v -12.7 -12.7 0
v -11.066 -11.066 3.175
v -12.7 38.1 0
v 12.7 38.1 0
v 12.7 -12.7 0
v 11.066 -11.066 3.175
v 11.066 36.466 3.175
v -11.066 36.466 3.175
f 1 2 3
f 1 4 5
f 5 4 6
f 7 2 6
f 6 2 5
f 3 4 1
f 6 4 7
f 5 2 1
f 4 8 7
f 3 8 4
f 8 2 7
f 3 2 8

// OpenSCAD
//Base Generator for Miniature Wargamers

//Measurements in milimeters or inches?
units=1; // [0:millimeters, 1:inches]
//how wide in mm should the base be?
base_width = 1;
//how deep should the base be? must be equal to or greater than width
base_depth = 2;
//how tall should the base be?
base_height = .125;
//What angle should the sides be? 70 is a good value; use 90 for straight sides
angle= 70;
//what shape?
shape=4; // [4:rectangle, 6:octangle, 80:lozenge]
/* [Base Slot] */
//What kind of slot?
slot_type=0; // [0:none, 1:end to end, 2:corner to corner, 3:end-to-end double]
//How long is the slot?
slot_length = .5;
//How wide is the slot?
slot_width = .09;
//For offset slots, how deep is the offset? (required for double slots)
slot_offset = 0;
/* [Base Indent] */
//% to indent the top surface? (0 for no indent)
base_indent=0;
//% of top surface to indent?
base_indent_area=95;
/* [Central Hole] */
//what shape?
hole_shape=0; // [0:none, 4:diamond, 6:hexagon, 80:round]
//hole diameter?
hole_radius=.35;
/* [Nameplate] */
//What kind of nameplate?
nameplate_type=0; // [0:none, 1:nameplate lengthwise]
//How long is the nameplate?
nameplate_length = 1.5;
//How wide is the nameplate?
nameplate_width = .3;
//Offset how far from the center?
nameplate_offset = .3;
/* [Number of Bases] */
// Number of rows of bases
rows = 1; // [1:10]
// Number of columns of bases
columns = 1; // [1:10]



module base(width, depth, height, side_angle, sides, bslot, slength, swidth, sback, bindent, biarea, hshape, hradius, ntype, nlength, nwidth, noffset)
{

/* [Hidden] */
  $fa=0.5; // default minimum facet angle
  $fs=0.5; // default minimum facet size
  convf = 25.4; // inches to mm

// conversions to metric (if needed)

  bh = units ? height * convf : height;
  bw = units ? width * convf : width;
  bd = units ? depth * convf : depth;
  sl = units ? slength * convf : slength;
  sw = units ? swidth * convf : swidth;   
  sb = units ? sback * convf : sback;   
  hr = units ? hradius * convf : hradius;
  nl = units ? nlength * convf : nlength;
  nw = units ? nwidth * convf : nwidth;   
  npo = units ? noffset * convf : noffset;     
  
// if rectangle, rotate from diamond to rectangle    
    
  rangle = sides == 4 ? 45 : 0;
    
  inset = bh/tan(angle);
  radius1 = sides == 4 ? sqrt(2) * bw / 2 : bw/2;
  radius2 = radius1 - inset * 2;
  diff = sides == 6 ? bd - (sqrt(3) * radius1) : bd - bw;
  offset1 = sides == 4 ? sqrt((diff * diff)/2): 0;
  offset2 = sides == 4 ? sqrt((diff * diff)/2): diff;
  
  
  // slot variables
   
  sangle = (bslot == 2) ? atan(bw/bd) : 0; // angle of slot
  slot_offset = (sb) ? (sides == 4) ? sqrt((sb * sb)/2) : sb : 0;
  
  
  doff = (sides == 6) ? bd/2 - (sqrt(3) * radius1)/2 : bd/2 - bw/2;
  
 
  soffset_x = sqrt(((doff - slot_offset) * (doff - slot_offset))/2);
  soffset_y = sqrt(((doff + slot_offset) * (doff + slot_offset))/2);
  
  np_offset = sqrt(((npo) * (npo))/2);
  
  rotate(rangle)
  {
      difference()
      {
        hull()
        {
        cylinder(r1=radius1, r2=radius2, h=bh, $fn=sides);
        translate([offset1,offset2,0])
          cylinder(r1=radius1, r2=radius2, h=bh, $fn=sides);      
        }

        if (bslot) // if base slot
        {
          if (sides==4)
          {
          translate([soffset_x,soffset_y,bh / 2])        
            color([0,0,1])
              rotate(sangle - 45)
                cube([sw,sl, bh + 4], center=true);
          }
          else
          {
             translate([0 - slot_offset,doff,bh / 2])        
               color([0,0,1])
                 rotate(sangle)
                   cube([sw,sl, bh + 4], center=true);              
          }
        }
        if (bslot == 3) // if double slot
          {
            if (sides == 4)
              translate([soffset_y,soffset_x,bh / 2])
                color([0,0,1])
                  rotate(sangle - 45)
                    cube([sw,sl, bh + 4], center=true);        
            else
              translate([slot_offset, doff, bh / 2])
                color([0,0,1])
                  cube([sw,sl, bh + 4], center=true);              
          }
        if (bindent) // if indented top
          {
            if (sides == 4)
            {
              translate([0,0,bh * (100 - bindent)/100])
                color([0,0,1])
                    hull()
                    {
                      cylinder(r1=radius2 * (biarea)/100, r2=radius2 * (biarea)/100, h=bh, $fn=sides);
                      translate([offset1,offset2,0])
                        cylinder(r1=radius2 * (biarea)/100, r2=radius2 * (biarea)/100, h=bh, $fn=sides);  
                    }
            }    
            else
              translate([0, 0, bh * (100 - bindent)/100])
                color([0,0,1])
                  hull()
                  {
                    cylinder(r1=radius2 * (biarea)/100, r2=radius2 * (biarea)/100, h=bh, $fn=sides);
                    translate([offset1,offset2,0])
                      cylinder(r1=radius2 * (biarea)/100, r2=radius2 * (biarea)/100, h=bh, $fn=sides);              }
          }    
          if (hshape) // if central hole
          {
            if (sides == 4)
            {
              translate([soffset_x,soffset_y,-2])
                rotate(45)
                  color([0,0,1])
                    cylinder(r=hr, h=bh+4, $fn=hshape);
            }    
            else
            {
              translate([0, doff, -2])
                color([0,0,1])
                 cylinder(r=hr, h=bh+4, $fn=hshape);
            }
          }       
      }
      if (nameplate_type)
          if (sides == 4)
            translate([soffset_x - np_offset,soffset_y + np_offset,4])
              rotate(45)
                color([0,0,1])
                  cube([nl,nw, bh], center=true);
          else
              translate([npo,(sides == 6) ? bd/2 - (sqrt(3) * radius1)/2 : bd/2 - bw/2,4])
                rotate(90)
                  color([0,0,1])
                    cube([nl,nw, bh], center=true);

   }
}


module make_x_by_y (x,y)
{
    
/* [Hidden] */
  convf = 25.4; // inches to mm    
    
// conversions to metric (if needed)

  xspace = units ? base_width * convf + 2 : base_width + 2;
  yspace = units ? base_depth * convf + 2 : base_depth + 2;
    
	for (j = [0:y])
    {
		for (i = [0:x])
        {
			translate([i*xspace,j*yspace,0]) children(0);
		}
	}
}

make_x_by_y(rows - 1,columns - 1)
{
	base(base_width, base_depth, base_height, angle, shape, slot_type, slot_length, slot_width, slot_offset, base_indent, base_indent_area, hole_shape, hole_radius, nameplate_type, nameplate_length, nameplate_width, nameplate_offset);
}

// Written in 2016 by Bill Armintrout <http://theminiaturespage.com>
//
// To the extent possible under law, the author(s) have dedicated all
// copyright and related and neighboring rights to this software to the
// public domain worldwide. This software is distributed without any
// warranty.
